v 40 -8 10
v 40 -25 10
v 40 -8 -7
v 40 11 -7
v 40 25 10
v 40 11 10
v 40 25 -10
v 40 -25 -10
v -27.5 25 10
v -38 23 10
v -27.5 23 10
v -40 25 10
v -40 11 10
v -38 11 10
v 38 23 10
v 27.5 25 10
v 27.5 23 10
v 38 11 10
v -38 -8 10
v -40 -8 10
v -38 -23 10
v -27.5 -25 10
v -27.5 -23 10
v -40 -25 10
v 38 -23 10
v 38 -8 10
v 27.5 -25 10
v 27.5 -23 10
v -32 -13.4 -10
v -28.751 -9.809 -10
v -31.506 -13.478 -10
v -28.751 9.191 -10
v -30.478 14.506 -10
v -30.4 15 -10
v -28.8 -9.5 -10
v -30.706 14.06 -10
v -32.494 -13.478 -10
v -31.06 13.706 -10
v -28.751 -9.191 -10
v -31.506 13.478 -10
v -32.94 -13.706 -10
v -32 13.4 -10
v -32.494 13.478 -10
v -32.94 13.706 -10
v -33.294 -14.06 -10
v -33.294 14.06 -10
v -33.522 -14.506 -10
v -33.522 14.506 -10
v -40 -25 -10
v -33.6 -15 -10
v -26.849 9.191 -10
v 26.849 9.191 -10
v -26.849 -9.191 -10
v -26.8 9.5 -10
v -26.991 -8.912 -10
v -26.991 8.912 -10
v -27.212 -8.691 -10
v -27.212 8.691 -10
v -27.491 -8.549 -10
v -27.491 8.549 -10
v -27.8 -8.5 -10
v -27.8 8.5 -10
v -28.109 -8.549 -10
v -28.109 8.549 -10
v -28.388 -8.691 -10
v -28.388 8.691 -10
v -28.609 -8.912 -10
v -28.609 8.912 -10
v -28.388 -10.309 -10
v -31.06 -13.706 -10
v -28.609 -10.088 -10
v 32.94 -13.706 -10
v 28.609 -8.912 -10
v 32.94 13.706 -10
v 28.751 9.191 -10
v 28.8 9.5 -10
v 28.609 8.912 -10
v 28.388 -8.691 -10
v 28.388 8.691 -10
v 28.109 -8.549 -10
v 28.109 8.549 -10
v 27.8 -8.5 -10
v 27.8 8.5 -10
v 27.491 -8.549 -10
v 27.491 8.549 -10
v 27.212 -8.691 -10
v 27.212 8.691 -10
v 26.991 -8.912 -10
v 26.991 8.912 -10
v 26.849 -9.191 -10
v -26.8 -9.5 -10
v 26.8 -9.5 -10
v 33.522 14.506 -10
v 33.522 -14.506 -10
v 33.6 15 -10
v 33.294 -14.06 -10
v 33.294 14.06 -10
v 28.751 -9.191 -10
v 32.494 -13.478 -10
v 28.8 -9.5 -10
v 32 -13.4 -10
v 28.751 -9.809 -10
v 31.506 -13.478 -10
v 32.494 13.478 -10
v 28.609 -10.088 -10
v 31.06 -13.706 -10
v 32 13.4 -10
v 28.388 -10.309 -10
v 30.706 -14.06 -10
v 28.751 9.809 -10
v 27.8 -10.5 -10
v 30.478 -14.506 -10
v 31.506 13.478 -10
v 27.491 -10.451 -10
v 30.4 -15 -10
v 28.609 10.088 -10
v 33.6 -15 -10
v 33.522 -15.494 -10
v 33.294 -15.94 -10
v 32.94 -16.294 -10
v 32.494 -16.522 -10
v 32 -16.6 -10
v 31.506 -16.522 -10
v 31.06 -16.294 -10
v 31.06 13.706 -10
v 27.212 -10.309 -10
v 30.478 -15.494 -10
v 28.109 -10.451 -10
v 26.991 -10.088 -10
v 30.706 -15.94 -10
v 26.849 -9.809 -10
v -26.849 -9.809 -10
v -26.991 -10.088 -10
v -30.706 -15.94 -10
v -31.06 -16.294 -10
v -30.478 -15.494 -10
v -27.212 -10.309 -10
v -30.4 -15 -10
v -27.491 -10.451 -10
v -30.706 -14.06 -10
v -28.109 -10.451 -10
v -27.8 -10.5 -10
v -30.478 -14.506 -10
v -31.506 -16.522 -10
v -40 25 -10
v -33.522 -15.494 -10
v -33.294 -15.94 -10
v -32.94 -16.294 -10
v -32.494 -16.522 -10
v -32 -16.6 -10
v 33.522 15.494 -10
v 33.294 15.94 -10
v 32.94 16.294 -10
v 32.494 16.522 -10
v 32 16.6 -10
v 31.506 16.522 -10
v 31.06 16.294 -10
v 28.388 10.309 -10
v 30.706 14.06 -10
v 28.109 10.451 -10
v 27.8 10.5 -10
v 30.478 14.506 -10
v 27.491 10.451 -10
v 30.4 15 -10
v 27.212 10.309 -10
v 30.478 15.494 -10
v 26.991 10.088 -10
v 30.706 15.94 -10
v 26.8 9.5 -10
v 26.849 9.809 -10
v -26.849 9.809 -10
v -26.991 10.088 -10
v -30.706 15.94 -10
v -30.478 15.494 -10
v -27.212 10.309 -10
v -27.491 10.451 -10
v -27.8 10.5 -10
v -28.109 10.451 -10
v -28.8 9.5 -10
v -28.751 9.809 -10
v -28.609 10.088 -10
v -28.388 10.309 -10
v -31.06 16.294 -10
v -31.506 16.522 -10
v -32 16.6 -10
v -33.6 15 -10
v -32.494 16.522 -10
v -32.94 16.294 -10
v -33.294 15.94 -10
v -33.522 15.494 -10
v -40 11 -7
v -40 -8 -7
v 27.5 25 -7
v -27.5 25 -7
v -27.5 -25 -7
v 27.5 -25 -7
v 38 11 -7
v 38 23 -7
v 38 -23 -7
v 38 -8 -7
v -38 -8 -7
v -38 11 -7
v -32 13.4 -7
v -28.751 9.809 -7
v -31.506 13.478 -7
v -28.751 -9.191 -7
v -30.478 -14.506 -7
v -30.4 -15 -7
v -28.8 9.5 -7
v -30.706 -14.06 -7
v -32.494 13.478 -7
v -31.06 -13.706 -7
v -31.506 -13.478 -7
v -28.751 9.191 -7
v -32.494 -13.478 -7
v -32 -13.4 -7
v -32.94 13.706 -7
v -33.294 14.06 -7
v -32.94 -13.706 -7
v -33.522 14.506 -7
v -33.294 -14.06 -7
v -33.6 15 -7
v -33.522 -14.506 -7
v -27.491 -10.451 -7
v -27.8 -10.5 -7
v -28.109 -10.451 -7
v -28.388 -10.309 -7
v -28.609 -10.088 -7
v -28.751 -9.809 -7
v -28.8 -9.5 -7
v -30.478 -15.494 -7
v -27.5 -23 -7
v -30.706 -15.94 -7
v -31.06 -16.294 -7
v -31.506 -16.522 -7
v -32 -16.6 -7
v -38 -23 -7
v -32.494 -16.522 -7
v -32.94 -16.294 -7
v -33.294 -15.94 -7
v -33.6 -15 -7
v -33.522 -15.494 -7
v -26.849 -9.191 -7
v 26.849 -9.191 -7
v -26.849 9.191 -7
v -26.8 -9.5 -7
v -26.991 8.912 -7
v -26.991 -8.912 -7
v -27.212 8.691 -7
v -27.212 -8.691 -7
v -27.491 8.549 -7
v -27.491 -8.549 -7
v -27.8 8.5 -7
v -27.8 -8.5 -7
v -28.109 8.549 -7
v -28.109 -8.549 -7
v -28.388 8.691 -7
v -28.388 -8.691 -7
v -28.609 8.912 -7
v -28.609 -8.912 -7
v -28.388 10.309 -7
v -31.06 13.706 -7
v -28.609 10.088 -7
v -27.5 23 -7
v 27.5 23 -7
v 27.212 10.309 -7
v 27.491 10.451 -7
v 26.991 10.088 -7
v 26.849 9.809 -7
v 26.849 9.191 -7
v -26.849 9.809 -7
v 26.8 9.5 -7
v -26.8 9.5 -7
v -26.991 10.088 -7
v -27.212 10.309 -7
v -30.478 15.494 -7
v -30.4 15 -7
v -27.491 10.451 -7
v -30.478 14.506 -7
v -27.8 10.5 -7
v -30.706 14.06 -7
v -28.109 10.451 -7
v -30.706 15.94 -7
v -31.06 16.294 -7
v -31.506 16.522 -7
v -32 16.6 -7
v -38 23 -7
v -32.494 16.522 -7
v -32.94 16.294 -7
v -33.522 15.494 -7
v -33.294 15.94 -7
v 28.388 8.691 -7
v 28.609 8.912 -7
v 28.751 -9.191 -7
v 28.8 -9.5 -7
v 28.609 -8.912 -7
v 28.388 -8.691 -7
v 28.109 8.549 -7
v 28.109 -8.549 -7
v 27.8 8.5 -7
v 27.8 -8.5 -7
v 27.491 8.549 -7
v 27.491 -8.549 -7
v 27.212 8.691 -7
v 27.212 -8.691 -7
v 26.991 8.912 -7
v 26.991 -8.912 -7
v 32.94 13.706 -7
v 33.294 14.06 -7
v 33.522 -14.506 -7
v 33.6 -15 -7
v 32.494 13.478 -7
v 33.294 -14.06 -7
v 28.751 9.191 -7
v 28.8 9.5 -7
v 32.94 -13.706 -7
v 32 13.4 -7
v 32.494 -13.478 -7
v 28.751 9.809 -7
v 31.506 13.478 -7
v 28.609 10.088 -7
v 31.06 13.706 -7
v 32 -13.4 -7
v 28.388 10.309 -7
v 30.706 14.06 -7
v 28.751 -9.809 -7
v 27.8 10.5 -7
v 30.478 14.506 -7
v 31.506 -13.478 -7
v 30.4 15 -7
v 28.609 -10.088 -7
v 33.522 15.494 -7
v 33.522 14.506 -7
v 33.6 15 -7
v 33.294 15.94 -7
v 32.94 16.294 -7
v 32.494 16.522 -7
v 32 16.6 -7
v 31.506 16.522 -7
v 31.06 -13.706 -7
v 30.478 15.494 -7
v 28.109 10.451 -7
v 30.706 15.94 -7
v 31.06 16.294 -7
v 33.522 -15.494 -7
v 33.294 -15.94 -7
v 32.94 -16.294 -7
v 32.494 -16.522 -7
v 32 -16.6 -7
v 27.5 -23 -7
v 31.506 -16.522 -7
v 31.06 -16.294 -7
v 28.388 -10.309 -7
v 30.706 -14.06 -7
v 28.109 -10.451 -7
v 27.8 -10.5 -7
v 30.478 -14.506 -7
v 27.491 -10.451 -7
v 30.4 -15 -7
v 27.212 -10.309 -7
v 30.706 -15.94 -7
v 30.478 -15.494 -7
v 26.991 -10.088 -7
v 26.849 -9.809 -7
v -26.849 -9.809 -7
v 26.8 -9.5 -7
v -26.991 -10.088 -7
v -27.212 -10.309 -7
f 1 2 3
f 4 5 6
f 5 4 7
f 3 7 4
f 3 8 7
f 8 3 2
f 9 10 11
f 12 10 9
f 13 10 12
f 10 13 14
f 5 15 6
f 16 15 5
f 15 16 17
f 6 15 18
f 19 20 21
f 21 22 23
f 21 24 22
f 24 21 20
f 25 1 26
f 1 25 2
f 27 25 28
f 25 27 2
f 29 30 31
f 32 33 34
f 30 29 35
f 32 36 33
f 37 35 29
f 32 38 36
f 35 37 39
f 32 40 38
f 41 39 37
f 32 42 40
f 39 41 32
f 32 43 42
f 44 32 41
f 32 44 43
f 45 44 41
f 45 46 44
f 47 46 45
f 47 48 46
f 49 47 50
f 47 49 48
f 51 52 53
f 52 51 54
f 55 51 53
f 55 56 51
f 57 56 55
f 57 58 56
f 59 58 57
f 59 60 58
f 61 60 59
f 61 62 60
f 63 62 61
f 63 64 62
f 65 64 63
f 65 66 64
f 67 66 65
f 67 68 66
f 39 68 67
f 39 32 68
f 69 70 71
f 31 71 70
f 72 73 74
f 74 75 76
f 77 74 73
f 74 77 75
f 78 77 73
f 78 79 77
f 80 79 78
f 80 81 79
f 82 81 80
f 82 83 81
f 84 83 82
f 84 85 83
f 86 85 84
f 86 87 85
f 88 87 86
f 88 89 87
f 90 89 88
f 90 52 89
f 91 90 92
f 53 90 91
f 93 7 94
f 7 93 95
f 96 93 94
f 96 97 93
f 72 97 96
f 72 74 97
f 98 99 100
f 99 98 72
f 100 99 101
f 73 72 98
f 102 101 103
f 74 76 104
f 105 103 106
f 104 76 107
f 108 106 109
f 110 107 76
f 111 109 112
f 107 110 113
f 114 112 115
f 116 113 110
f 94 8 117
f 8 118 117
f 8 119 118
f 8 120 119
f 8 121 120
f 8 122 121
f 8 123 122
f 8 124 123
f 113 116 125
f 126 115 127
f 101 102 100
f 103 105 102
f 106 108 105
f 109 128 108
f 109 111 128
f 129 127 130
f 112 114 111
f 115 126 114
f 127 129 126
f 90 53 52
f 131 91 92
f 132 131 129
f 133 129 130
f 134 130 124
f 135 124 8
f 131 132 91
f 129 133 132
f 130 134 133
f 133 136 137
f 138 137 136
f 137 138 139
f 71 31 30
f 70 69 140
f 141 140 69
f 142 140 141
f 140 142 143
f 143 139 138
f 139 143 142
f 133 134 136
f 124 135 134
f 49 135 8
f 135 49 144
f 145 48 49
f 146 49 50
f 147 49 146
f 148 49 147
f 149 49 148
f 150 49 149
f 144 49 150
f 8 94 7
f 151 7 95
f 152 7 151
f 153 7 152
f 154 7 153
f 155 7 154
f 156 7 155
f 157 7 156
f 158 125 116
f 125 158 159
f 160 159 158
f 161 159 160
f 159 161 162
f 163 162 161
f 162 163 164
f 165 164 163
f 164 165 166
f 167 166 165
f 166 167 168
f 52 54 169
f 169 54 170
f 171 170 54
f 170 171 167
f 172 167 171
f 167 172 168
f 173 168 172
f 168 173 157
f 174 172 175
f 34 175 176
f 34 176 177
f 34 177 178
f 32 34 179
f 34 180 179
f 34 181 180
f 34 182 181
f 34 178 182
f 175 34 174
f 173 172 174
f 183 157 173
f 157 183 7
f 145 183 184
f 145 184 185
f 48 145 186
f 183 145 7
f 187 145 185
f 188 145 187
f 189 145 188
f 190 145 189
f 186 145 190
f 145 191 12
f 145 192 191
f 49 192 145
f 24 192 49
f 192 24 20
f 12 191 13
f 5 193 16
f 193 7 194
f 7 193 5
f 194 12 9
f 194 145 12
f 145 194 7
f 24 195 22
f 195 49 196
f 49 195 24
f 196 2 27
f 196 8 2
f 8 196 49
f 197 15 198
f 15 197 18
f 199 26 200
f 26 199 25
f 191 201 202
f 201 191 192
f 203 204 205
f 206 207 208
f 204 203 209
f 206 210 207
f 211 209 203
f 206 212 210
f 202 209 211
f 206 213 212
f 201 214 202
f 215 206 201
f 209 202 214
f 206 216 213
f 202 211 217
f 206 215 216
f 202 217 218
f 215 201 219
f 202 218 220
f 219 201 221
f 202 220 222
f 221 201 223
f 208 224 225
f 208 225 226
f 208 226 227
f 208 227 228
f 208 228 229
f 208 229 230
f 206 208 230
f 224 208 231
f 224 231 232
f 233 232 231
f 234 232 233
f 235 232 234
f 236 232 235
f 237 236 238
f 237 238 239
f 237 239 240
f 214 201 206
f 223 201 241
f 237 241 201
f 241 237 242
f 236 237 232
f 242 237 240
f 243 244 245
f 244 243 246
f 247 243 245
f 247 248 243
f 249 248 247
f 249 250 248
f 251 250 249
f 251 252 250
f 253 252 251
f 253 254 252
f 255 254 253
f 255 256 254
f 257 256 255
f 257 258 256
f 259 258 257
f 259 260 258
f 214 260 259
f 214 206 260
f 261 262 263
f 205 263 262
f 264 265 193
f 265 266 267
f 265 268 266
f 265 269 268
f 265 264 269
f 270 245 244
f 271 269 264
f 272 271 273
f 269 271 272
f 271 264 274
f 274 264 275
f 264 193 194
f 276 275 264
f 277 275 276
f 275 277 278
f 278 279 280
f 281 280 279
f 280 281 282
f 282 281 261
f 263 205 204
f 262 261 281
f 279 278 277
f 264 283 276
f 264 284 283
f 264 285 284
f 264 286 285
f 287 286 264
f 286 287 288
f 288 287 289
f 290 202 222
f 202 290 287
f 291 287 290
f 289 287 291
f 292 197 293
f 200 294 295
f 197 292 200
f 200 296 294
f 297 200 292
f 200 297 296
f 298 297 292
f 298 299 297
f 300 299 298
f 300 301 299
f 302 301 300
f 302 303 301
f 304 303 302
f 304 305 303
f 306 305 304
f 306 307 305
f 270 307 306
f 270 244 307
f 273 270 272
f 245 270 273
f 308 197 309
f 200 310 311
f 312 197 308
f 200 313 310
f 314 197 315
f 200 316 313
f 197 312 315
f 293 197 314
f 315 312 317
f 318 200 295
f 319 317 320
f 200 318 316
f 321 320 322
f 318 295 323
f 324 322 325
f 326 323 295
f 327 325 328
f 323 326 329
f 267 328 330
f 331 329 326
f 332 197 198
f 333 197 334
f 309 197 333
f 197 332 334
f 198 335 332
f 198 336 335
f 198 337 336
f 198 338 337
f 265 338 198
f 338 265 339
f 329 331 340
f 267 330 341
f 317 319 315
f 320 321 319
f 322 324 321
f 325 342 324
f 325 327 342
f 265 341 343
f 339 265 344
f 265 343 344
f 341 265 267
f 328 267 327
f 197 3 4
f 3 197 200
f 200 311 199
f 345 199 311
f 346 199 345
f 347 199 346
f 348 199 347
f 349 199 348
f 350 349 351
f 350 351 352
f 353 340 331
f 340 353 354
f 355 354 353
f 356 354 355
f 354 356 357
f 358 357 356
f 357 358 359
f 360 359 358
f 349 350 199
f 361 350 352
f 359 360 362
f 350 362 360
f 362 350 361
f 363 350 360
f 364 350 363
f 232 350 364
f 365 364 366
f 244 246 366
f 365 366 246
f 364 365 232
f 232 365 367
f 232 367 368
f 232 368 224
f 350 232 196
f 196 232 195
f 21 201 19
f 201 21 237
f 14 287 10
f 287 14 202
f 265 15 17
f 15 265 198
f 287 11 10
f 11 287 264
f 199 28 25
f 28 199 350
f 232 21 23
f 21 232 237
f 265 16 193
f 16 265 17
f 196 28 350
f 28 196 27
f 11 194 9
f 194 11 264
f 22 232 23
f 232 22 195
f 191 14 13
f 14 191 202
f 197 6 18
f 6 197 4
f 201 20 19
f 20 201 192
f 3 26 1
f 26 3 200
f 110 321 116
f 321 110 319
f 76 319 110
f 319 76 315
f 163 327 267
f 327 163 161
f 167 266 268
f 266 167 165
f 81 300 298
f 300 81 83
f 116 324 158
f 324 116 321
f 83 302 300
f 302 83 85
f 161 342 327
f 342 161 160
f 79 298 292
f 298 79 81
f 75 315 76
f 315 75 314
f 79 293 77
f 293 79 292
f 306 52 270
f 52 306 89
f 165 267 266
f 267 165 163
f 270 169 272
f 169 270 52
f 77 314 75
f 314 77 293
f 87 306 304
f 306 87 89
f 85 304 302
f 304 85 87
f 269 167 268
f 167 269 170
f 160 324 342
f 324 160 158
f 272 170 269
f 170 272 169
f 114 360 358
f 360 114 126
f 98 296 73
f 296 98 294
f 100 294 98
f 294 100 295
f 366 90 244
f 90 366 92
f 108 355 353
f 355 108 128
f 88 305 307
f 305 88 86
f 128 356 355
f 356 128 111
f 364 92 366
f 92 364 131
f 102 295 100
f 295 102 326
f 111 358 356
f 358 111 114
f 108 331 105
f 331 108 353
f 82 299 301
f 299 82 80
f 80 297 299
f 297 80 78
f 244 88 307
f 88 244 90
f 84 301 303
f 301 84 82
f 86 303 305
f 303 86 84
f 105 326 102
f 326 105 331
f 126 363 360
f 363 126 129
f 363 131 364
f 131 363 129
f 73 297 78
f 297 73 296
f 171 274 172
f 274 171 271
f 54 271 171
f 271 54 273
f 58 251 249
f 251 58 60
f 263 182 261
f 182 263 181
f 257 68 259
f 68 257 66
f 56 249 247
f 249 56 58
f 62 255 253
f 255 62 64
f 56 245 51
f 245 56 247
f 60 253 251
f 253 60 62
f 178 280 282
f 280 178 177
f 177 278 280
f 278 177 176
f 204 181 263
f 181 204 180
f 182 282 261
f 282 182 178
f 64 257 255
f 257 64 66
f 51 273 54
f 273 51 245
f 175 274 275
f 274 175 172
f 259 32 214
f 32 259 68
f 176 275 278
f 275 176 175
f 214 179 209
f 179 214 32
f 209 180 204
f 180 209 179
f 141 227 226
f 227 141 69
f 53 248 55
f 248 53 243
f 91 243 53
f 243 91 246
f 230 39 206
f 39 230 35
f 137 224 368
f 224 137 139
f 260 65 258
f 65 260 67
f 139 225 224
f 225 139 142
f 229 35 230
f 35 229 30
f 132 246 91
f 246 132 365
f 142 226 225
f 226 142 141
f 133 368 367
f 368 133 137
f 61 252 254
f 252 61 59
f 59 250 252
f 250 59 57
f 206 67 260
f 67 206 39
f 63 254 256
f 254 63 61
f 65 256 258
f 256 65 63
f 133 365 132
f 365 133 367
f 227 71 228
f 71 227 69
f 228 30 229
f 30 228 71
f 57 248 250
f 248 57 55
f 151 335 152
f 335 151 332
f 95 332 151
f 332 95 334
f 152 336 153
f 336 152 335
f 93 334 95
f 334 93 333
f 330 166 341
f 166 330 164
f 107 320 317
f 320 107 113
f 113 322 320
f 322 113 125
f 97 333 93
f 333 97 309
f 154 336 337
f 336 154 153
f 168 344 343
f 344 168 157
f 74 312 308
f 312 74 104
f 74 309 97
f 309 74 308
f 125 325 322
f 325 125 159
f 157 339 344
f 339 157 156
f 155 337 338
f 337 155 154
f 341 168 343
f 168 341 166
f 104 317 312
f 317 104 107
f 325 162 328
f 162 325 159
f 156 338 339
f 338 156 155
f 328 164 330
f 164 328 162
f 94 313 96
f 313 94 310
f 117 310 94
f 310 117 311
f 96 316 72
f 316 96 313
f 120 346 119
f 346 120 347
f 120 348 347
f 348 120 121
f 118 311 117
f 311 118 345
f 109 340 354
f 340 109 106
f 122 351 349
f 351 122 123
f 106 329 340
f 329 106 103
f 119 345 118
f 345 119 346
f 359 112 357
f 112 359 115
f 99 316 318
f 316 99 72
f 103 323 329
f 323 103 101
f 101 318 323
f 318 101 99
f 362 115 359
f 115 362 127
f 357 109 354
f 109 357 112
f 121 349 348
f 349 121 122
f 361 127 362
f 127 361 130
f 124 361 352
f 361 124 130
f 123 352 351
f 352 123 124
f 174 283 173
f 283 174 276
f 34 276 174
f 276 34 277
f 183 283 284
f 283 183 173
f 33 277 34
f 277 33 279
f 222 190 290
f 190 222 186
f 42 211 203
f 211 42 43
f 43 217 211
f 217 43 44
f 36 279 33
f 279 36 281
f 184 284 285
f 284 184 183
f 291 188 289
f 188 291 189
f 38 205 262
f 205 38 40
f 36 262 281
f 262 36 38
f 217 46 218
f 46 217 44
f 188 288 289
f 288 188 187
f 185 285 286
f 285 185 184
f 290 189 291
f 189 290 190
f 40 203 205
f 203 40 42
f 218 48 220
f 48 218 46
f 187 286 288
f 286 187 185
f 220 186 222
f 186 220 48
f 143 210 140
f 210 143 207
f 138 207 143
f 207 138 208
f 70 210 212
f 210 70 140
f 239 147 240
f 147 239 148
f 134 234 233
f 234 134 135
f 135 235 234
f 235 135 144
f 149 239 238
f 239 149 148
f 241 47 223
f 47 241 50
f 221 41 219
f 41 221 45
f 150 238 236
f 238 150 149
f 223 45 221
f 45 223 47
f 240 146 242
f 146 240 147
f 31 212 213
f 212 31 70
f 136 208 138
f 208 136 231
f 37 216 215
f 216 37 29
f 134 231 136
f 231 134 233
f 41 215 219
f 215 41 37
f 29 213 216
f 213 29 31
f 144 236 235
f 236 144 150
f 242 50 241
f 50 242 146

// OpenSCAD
// Case enclosure for:
//   single Adafruit PCA9685 16-channel PWM driver board
//

// Number of facets for cylinders
$fn = 20;

enclosure_x_dim = 80;
enclosure_y_dim = 50;
enclosure_height = 20;

pca9685_standoff_x_offset = 27.8;
pca9685_standoff_y_offset = 9.5;
standoff_hole_radius = 1;

mount_x_offset = 32;
mount_y_offset = 15;
mount_hole_radius = 1.6;

base_thickness = 3;
wall_width = 2;
wall_height = enclosure_height;

BELOW_PLANE = -1;
INF = 100000;

difference() {
    // outer extents
    cube([enclosure_x_dim ,enclosure_y_dim ,enclosure_height], center = true);

    // cutout inside to form walls
    translate([0,   0, base_thickness])cube([enclosure_x_dim -(2*wall_width),enclosure_y_dim -(2*wall_width), wall_height], center = true);
 
    // I/O side cuts
    translate([0, 0, base_thickness])cube([55,INF,wall_height], center = true);
    translate([0, 1.5, base_thickness])cube([INF,19,wall_height], center = true);
         
    // pca9685 mounting holes
    translate([pca9685_standoff_x_offset,pca9685_standoff_y_offset, BELOW_PLANE])   cylinder(r=standoff_hole_radius, h=INF, center=true);
    translate([pca9685_standoff_x_offset,-pca9685_standoff_y_offset, BELOW_PLANE])  cylinder(r=standoff_hole_radius, h=INF, center=true);
    translate([-pca9685_standoff_x_offset,pca9685_standoff_y_offset, BELOW_PLANE])  cylinder(r=standoff_hole_radius, h=INF, center=true);
    translate([-pca9685_standoff_x_offset,-pca9685_standoff_y_offset, BELOW_PLANE]) cylinder(r=standoff_hole_radius, h=INF, center=true);

    // Enclosure mounting holes
    translate([mount_x_offset,mount_y_offset, BELOW_PLANE])   cylinder(r=mount_hole_radius, h=INF, center=true);
    translate([mount_x_offset,-mount_y_offset, BELOW_PLANE])  cylinder(r=mount_hole_radius, h=INF, center=true);
    translate([-mount_x_offset,mount_y_offset, BELOW_PLANE])  cylinder(r=mount_hole_radius, h=INF, center=true);
    translate([-mount_x_offset,-mount_y_offset, BELOW_PLANE]) cylinder(r=mount_hole_radius, h=INF, center=true);
}
